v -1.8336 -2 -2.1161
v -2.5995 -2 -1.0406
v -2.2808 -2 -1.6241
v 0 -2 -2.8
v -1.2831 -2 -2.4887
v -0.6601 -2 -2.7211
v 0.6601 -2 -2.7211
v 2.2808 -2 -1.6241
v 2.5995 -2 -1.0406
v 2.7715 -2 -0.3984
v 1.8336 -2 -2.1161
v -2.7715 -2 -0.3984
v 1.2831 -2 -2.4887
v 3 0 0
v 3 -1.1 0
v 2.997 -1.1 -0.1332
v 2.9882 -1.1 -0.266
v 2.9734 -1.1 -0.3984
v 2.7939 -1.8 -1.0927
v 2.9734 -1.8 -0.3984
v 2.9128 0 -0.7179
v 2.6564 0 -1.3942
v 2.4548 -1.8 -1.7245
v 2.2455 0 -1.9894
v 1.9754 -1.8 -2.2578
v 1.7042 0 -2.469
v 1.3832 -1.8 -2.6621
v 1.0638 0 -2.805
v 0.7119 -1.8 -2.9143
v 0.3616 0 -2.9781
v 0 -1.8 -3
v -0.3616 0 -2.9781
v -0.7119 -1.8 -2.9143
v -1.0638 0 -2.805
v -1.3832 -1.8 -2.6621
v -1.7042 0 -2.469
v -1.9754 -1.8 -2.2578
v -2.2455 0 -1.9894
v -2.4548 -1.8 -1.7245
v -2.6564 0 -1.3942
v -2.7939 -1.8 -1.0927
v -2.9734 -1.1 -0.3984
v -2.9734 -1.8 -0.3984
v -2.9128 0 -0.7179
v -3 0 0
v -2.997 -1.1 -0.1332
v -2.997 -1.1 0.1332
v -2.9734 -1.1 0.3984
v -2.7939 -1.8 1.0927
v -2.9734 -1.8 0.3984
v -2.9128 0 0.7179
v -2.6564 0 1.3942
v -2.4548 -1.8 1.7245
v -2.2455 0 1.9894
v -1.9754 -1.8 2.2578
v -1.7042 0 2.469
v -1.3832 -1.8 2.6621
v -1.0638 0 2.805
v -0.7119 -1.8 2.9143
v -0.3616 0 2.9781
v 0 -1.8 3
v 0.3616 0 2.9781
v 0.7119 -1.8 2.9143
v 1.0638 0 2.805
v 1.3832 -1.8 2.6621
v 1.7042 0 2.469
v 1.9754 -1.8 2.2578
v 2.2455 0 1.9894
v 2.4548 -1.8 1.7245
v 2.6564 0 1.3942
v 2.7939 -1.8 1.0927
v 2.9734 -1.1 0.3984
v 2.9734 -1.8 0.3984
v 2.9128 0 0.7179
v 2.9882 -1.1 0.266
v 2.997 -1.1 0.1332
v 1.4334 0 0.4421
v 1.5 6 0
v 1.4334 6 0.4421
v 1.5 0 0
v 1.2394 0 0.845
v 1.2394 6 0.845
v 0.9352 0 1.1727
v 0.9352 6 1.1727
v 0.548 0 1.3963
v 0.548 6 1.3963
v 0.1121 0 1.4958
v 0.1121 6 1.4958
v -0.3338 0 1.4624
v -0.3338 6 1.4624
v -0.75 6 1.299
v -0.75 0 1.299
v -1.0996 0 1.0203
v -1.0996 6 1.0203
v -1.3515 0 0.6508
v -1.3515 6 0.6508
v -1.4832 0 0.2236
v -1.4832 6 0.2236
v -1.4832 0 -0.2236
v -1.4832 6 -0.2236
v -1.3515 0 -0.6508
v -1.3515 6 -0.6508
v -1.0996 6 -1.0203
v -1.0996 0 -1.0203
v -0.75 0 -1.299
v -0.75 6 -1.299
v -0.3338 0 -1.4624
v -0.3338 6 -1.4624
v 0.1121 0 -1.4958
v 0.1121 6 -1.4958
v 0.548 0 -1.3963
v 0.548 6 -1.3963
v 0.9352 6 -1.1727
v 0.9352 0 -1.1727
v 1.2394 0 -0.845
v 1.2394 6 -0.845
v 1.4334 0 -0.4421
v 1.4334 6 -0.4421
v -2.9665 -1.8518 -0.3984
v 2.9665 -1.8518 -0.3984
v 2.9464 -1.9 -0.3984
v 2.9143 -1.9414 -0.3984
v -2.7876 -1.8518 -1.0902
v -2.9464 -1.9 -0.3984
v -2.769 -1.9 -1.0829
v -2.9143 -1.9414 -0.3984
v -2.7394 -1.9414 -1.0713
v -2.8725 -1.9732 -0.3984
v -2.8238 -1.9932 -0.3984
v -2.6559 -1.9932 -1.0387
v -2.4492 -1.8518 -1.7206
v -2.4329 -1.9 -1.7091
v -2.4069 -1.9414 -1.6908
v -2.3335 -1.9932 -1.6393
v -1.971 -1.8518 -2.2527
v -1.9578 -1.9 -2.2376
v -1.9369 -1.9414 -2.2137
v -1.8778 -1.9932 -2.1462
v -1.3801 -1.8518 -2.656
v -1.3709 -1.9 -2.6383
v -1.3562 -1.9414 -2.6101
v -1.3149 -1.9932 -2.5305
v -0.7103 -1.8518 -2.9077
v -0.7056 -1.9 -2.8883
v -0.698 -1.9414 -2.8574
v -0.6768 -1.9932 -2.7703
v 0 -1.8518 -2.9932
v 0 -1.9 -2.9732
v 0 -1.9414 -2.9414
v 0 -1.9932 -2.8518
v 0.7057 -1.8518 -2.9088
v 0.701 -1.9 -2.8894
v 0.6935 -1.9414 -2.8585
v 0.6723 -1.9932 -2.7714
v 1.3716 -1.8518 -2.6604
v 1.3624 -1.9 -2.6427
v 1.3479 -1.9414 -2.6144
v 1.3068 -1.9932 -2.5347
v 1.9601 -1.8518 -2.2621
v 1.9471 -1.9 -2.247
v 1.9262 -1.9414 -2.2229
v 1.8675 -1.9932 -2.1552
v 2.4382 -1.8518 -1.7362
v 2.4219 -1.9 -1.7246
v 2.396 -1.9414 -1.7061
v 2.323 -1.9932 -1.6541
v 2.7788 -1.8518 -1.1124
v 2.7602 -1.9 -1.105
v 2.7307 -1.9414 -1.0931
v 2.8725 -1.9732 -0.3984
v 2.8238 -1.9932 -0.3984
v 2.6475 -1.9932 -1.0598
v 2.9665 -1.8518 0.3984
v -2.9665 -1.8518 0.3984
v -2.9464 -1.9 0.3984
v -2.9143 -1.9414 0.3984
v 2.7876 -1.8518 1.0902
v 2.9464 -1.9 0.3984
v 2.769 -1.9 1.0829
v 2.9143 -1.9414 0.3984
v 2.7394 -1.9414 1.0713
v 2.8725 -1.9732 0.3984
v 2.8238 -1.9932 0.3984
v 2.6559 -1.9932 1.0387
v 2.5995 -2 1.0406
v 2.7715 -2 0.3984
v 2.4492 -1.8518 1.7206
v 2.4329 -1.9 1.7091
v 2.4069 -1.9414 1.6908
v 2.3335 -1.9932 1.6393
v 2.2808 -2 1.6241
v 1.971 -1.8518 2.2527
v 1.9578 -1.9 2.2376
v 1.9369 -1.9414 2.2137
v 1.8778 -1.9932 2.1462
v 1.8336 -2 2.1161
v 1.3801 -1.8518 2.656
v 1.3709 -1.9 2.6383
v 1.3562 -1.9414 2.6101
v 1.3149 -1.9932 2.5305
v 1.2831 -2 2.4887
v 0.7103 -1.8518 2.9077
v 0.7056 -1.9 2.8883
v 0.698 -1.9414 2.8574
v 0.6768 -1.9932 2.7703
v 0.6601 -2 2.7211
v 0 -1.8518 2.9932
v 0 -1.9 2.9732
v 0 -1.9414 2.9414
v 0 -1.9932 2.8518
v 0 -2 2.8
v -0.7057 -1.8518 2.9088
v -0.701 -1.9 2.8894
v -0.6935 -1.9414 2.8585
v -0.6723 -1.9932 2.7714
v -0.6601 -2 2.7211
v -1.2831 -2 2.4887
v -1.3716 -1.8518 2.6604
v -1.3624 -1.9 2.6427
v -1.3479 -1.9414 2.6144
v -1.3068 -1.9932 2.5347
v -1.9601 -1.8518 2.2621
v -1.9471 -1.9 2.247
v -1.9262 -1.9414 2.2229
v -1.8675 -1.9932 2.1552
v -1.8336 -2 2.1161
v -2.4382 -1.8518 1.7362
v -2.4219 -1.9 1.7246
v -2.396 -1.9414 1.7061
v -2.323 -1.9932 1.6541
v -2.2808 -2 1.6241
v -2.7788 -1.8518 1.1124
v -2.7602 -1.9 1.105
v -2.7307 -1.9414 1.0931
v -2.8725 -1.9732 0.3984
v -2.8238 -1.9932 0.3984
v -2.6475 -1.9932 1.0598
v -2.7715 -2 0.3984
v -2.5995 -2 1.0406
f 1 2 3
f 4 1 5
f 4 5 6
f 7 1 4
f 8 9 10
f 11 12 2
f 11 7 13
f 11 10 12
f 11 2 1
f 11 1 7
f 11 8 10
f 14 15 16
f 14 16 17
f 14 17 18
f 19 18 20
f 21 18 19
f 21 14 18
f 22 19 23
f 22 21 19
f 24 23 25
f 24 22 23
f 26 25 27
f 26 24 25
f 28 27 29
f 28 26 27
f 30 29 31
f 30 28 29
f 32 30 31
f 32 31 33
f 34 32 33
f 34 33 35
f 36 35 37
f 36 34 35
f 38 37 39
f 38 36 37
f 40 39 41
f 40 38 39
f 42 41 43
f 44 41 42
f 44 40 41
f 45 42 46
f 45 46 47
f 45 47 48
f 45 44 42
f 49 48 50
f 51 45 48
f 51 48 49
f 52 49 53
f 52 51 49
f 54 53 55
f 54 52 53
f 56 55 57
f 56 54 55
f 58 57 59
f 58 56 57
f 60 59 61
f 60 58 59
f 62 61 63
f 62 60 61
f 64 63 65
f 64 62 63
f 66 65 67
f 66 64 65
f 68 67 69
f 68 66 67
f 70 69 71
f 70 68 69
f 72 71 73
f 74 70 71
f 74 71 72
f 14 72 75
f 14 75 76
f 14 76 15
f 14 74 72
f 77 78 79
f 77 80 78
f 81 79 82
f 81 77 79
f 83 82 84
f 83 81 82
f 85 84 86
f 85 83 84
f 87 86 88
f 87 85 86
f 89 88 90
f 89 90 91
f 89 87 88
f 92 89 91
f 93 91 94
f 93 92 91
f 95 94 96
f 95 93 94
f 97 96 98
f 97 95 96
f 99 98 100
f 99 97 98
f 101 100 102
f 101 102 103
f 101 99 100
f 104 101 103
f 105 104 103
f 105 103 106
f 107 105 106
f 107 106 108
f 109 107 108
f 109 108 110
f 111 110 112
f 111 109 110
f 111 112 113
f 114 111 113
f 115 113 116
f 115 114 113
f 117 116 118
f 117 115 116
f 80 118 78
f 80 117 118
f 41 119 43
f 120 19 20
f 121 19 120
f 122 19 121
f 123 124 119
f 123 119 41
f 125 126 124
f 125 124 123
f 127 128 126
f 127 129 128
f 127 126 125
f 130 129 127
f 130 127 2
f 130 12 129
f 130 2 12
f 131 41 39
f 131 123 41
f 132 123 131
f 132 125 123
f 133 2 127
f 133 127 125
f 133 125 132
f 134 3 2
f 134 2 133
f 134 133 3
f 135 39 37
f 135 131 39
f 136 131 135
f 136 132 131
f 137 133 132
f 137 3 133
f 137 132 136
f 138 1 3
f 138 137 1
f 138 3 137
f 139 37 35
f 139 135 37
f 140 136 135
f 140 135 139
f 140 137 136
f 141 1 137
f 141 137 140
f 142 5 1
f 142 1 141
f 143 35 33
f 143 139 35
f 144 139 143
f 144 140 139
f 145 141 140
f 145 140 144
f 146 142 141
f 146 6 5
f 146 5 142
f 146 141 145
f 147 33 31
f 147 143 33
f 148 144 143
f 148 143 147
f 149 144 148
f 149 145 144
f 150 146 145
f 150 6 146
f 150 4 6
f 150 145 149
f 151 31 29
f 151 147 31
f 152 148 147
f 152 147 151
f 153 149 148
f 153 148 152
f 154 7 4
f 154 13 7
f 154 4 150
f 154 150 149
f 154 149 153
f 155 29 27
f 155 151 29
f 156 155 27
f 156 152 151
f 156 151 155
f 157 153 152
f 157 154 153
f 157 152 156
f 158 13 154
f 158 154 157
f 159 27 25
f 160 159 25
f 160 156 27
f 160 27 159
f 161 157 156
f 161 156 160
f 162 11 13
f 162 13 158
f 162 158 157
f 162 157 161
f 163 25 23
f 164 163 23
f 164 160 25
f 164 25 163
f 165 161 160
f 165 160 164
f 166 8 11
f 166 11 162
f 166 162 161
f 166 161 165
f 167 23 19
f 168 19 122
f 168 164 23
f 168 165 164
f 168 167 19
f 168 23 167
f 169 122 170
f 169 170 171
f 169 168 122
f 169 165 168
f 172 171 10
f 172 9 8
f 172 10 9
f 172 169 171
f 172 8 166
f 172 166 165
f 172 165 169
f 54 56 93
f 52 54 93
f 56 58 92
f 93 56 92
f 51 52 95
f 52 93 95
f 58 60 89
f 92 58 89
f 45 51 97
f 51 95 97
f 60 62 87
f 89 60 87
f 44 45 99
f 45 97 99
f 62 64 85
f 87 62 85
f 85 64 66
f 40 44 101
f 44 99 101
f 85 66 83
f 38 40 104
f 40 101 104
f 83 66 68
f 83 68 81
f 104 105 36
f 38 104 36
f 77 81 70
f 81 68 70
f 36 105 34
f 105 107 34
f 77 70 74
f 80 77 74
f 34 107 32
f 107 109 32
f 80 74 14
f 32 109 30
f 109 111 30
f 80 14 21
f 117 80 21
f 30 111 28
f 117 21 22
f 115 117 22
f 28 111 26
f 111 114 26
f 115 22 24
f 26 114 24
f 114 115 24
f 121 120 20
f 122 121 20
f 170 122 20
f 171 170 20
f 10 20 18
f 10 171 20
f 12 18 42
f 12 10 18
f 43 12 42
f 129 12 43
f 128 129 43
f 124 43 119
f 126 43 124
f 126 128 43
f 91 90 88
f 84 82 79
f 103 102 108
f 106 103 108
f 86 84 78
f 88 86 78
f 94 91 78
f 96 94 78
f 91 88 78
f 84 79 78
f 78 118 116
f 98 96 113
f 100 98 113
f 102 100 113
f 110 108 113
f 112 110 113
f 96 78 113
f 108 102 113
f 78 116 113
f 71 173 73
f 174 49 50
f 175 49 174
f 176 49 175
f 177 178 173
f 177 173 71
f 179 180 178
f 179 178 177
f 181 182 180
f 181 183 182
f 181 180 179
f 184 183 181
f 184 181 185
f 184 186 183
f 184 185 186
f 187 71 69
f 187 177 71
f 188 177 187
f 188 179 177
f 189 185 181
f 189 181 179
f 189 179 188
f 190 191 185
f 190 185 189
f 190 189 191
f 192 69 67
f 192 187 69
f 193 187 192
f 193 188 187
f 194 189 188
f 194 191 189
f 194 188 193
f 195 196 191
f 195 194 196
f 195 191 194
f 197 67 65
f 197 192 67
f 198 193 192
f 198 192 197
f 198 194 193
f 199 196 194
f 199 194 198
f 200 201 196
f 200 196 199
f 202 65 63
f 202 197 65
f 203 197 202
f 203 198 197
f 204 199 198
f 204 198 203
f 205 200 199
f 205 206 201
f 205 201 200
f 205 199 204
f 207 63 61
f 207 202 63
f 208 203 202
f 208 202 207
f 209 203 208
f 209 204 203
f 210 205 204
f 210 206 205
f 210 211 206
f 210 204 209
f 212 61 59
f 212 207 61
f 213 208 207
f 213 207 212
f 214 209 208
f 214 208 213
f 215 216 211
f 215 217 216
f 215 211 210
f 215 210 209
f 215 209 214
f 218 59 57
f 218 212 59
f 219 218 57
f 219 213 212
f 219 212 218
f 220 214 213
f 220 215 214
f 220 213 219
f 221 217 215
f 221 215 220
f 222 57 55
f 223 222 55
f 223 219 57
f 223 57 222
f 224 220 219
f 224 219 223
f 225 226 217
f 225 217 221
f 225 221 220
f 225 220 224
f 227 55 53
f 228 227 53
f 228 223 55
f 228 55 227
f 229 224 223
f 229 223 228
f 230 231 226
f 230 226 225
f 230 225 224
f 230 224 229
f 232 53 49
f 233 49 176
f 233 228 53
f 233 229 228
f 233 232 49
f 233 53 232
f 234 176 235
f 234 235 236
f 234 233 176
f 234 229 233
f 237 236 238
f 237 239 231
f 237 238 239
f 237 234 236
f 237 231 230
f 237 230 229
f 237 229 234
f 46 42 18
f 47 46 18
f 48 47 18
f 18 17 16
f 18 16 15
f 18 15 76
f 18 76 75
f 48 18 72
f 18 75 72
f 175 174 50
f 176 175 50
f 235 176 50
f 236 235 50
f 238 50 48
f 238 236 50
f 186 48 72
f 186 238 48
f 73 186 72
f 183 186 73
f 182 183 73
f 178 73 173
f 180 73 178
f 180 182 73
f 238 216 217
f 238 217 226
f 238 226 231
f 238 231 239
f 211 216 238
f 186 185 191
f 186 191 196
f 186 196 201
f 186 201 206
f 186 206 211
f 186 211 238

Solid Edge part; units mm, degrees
sketch "Sketch1" plane through (0, 0, 0) normal (0, -1, 0) x (1, 0, 0)
  circle A0 centre (0, 0) radius 1.5
extrude "Protrusion1" add sketch "Sketch1" against normal blind 6
sketch "Sketch2" plane through (0, 0, 0) normal (0, -1, 0) x (1, 0, 0)
  circle A0 centre (0, 0) radius 3
extrude "ExtrudedProtrusion_2" add sketch "Sketch2" along normal blind 2
cosmetic_thread "Thread1" size "M3"
sketch "Sketch3" plane through (0, -2, 0) normal (0, -1, 0) x (1, 0, 0)
  line L0 (2.9734, -0.3984) -> (-2.9734, -0.3984)
  line L1 (-2.9734, 0.3984) -> (2.9734, 0.3984)
  arc A0 (2.9734, 0.3984) -> (2.9734, -0.3984) centre (0, 0) cw
  arc A1 (-2.9734, -0.3984) -> (-2.9734, 0.3984) centre (0, 0) cw
extrude "ExtrudedCutout_1" cut sketch "Sketch3" against normal blind 0.9
fillet "Round_1" radius 0.2 2 edges at (0, -2, -3) (0, -2, 3)
properties material "Nylon, general purpose"
